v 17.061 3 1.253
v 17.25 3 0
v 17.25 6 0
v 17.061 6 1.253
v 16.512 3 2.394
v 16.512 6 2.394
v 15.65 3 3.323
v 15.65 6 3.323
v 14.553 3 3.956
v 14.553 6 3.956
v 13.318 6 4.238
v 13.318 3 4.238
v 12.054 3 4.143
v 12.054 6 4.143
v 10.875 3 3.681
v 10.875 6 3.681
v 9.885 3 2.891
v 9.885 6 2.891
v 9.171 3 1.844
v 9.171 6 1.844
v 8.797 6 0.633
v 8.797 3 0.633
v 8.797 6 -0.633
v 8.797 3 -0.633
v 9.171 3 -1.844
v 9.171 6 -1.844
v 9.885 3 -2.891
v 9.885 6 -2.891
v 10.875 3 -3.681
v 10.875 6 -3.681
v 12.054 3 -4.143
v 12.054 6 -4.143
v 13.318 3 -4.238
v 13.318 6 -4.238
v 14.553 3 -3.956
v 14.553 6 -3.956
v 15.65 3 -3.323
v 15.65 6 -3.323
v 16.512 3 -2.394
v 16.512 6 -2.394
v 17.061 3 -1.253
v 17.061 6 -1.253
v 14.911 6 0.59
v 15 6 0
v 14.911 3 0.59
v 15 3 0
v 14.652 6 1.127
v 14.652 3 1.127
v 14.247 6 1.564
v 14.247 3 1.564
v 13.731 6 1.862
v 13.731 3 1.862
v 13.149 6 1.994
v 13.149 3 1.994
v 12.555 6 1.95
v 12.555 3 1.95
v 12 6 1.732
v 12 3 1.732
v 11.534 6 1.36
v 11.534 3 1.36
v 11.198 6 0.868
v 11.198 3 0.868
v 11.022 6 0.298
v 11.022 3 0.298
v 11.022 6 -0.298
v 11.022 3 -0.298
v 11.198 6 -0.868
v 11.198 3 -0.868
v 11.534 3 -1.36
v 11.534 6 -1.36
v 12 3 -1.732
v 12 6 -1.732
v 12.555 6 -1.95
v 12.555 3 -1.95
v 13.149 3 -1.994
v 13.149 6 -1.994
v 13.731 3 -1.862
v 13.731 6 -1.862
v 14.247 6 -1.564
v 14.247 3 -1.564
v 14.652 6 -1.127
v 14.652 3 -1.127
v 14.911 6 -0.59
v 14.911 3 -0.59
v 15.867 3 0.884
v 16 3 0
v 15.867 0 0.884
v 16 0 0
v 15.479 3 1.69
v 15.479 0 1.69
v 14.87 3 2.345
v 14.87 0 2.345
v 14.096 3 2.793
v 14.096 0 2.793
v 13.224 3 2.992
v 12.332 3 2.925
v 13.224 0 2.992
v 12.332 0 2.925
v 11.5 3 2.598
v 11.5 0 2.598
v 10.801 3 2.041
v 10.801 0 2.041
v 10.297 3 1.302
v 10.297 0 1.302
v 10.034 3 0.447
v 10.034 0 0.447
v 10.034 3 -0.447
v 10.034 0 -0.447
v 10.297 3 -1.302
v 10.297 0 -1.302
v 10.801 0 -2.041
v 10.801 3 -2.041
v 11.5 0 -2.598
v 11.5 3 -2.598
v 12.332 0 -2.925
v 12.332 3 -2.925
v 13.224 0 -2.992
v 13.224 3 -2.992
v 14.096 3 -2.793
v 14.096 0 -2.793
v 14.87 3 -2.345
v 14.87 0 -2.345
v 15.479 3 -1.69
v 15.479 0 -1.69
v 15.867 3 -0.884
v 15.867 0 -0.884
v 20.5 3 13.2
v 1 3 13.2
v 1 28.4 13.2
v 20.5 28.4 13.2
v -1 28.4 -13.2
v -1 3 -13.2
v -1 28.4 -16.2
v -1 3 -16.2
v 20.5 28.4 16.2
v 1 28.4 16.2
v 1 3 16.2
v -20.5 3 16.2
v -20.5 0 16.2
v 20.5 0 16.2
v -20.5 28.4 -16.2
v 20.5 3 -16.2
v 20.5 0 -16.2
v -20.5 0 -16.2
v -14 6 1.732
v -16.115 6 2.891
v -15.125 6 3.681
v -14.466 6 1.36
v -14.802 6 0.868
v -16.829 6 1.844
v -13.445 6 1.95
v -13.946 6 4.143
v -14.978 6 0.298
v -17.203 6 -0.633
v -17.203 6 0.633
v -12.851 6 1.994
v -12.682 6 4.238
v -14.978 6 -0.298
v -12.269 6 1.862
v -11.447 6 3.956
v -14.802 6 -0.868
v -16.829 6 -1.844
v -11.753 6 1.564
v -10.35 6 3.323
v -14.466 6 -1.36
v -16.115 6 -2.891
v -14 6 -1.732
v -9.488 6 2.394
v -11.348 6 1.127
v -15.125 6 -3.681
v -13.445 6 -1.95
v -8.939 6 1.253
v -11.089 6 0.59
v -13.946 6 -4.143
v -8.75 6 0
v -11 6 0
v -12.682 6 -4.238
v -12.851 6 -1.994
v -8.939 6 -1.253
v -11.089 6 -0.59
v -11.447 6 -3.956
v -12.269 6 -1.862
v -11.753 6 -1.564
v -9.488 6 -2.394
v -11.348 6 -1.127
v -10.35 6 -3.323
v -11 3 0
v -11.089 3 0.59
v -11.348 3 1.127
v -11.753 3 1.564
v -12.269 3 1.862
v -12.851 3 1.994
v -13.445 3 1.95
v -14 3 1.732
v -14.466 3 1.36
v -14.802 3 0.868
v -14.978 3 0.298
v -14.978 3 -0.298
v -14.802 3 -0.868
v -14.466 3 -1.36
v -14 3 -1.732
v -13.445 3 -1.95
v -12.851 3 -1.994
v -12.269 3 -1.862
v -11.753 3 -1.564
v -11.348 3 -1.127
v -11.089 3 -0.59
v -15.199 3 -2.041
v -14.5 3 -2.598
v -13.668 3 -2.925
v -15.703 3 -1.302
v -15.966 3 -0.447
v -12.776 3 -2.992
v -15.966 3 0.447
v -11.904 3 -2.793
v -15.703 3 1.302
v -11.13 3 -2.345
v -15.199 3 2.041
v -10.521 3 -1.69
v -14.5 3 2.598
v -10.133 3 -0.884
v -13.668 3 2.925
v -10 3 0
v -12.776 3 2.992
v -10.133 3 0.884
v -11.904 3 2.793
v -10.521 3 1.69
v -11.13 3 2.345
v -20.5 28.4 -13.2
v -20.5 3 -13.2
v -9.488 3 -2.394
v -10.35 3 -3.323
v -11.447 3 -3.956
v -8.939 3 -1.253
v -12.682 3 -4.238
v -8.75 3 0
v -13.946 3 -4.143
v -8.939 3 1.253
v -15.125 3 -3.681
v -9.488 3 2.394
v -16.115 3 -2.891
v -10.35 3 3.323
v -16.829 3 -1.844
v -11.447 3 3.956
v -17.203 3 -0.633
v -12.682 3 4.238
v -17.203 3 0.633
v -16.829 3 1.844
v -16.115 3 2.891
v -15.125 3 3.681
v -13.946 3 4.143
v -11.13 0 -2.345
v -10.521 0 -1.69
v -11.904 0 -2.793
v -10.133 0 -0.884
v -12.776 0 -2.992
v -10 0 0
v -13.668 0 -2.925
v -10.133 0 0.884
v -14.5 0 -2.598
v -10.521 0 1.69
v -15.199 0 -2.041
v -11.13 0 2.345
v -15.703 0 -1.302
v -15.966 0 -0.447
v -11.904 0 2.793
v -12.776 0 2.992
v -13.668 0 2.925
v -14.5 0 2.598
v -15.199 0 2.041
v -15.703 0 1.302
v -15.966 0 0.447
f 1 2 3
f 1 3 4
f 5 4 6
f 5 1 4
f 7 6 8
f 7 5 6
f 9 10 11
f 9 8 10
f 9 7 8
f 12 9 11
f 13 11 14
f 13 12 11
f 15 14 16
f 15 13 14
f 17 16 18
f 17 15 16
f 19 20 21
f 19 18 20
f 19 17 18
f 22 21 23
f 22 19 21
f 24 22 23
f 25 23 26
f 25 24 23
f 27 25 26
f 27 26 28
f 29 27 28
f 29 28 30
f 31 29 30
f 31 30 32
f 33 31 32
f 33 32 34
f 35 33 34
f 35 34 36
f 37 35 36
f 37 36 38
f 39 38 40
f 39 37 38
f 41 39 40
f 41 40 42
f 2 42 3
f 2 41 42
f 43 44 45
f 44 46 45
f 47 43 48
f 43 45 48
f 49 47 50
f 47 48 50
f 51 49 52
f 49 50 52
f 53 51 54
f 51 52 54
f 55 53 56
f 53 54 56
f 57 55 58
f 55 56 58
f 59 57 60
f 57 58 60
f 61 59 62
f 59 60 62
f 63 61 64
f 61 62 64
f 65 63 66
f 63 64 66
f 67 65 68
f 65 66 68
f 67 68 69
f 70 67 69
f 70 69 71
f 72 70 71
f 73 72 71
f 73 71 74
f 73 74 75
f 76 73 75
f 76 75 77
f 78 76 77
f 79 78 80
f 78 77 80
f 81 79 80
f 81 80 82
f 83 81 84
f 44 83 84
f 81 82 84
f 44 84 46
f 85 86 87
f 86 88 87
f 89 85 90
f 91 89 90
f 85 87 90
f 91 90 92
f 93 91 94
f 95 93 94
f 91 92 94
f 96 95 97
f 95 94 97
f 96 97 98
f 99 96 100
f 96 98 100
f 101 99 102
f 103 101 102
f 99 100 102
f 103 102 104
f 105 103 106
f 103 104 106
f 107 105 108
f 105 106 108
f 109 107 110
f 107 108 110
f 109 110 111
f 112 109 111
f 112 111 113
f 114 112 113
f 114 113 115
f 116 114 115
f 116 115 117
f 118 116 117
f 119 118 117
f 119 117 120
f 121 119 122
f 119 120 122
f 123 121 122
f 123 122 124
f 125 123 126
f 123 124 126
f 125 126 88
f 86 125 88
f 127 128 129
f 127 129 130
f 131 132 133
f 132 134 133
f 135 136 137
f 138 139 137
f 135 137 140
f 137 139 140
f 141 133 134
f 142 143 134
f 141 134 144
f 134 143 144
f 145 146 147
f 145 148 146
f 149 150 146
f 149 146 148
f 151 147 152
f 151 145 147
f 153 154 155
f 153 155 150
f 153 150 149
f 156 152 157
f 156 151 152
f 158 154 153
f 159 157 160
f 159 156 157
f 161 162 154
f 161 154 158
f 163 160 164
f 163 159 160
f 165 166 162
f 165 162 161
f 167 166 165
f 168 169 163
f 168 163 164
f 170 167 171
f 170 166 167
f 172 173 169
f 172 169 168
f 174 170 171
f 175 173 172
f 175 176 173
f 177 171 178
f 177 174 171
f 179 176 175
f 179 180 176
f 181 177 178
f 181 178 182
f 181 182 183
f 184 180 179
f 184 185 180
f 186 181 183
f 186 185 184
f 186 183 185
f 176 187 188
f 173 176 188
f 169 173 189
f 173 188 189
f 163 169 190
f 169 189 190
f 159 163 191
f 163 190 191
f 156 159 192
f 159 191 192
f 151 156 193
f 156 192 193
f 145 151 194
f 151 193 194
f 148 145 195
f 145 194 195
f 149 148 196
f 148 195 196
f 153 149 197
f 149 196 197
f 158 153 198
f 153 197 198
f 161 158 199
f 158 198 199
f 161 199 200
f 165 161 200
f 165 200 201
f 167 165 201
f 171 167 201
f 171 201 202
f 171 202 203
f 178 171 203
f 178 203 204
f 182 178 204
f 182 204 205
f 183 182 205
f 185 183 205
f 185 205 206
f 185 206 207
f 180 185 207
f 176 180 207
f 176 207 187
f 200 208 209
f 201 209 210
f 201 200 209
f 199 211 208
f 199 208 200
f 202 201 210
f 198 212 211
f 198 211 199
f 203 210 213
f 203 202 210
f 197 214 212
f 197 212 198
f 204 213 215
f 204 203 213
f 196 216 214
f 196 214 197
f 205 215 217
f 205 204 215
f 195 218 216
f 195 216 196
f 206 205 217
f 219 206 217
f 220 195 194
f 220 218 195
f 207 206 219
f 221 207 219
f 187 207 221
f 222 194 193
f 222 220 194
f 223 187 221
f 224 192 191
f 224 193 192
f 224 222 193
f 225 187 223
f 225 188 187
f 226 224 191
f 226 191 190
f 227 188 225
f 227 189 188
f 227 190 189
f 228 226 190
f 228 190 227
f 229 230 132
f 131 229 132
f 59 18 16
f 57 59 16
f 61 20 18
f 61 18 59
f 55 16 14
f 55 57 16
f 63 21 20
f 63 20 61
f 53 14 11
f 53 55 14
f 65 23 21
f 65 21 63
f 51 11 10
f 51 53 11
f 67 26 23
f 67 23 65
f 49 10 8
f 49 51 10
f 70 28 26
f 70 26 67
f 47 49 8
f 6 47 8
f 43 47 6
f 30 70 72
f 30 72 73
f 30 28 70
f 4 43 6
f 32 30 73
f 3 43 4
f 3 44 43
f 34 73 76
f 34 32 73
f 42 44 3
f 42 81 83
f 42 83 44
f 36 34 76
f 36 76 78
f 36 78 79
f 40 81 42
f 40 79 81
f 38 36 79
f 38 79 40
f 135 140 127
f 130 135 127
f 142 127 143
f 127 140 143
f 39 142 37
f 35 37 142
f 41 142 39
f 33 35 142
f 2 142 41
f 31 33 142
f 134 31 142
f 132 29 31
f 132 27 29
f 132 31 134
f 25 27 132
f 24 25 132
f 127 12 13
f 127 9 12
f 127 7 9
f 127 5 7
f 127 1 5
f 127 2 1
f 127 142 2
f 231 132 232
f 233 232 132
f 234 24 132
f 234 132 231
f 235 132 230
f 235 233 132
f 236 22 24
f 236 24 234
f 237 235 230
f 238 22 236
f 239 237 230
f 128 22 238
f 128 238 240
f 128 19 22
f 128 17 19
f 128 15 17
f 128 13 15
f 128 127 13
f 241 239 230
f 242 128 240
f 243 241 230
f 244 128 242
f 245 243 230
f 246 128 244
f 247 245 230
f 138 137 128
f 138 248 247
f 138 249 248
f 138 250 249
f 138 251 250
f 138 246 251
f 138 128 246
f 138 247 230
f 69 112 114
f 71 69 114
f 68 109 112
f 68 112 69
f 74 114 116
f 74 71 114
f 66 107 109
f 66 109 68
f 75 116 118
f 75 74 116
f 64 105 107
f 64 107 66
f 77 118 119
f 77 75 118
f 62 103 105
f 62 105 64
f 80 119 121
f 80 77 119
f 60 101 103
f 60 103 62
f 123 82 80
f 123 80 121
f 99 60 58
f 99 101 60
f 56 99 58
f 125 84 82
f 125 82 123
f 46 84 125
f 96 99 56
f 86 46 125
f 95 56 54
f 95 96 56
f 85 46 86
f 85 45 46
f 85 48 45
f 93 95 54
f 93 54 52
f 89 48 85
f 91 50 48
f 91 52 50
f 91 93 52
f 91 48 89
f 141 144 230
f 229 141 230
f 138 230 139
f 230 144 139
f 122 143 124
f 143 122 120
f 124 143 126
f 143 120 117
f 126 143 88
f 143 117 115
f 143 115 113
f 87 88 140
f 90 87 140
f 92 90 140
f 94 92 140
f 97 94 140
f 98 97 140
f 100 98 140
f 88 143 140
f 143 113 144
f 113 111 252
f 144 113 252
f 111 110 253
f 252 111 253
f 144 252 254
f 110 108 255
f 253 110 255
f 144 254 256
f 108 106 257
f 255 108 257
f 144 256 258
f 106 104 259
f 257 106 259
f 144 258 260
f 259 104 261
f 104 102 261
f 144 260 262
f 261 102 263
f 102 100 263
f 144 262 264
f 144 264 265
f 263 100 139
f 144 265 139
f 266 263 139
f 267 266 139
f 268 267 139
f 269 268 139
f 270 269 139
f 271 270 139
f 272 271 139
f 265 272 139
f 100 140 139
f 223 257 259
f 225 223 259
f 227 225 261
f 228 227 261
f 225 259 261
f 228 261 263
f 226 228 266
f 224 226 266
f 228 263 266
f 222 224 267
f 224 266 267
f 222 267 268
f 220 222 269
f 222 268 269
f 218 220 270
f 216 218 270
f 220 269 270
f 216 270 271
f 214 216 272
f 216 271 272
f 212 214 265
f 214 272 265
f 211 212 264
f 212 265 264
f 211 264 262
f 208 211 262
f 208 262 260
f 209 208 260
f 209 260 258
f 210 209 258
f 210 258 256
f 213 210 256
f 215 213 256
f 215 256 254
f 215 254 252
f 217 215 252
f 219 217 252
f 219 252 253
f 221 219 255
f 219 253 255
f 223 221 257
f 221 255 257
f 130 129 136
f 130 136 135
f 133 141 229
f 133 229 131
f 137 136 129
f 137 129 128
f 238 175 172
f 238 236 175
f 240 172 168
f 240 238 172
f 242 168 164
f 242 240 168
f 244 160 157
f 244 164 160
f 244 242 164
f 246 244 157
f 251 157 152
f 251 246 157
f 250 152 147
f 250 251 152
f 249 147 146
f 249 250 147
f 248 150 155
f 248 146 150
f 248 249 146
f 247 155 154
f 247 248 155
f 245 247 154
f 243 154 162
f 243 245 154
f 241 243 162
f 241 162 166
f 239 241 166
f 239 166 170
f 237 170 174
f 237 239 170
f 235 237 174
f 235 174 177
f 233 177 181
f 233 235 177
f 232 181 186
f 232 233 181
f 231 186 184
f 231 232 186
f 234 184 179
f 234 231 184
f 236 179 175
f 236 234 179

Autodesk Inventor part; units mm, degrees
ref_plane "YZ Plane" through (0, 0, 0) normal (1, 0, 0) x (0, 1, 0)
ref_plane "XZ Plane" through (0, 0, 0) normal (0, 1, 0) x (-1, 0, 0)
ref_plane "XY Plane" through (0, 0, 0) normal (0, 0, 1) x (1, 0, 0)
sketch "Sketch1" plane through (0, 0, 0) normal (0, 1, 0) x (-1, 0, 0)
  line L0 (20.5, 16.2) -> (-20.5, 16.2)
  line L1 (-20.5, 16.2) -> (-20.5, -16.2)
  line L2 (-20.5, -16.2) -> (20.5, -16.2)
  line L3 (20.5, -16.2) -> (20.5, 16.2)
  point P0 (0, 0)
  dimension "d0" = 41
  dimension "d1" = 32.4
extrude "Extrusion1" add sketch "Sketch1" along normal blind 3
sketch "Sketch3" plane through (0, 3, 0) normal (0, 1, 0) x (1, 0, 0)
  line L0 (-20.5, -16.2) -> (20.5, -16.2) projected
  line L1 (-20.5, 16.2) -> (-20.5, -16.2) projected
  line L2 (20.5, -16.2) -> (-20.5, -16.2)
  line L3 (-20.5, -16.2) -> (-20.5, -13.2)
  line L4 (-20.5, -13.2) -> (20.5, -13.2)
  line L5 (20.5, -13.2) -> (20.5, -16.2)
  line L6 (20.5, 16.2) -> (-20.5, 16.2) projected
  line L7 (20.5, 16.2) -> (-20.5, 16.2)
  line L8 (-20.5, 16.2) -> (-20.5, 13.2)
  line L9 (-20.5, 13.2) -> (20.5, 13.2)
  line L10 (20.5, 13.2) -> (20.5, 16.2)
  point P0 (0, 0)
  dimension "d8" = 3
  dimension "d9" = 3
extrude "Extrusion3" add sketch "Sketch3" along normal blind 25.4
sketch "Sketch4" plane through (20.5, 0, -16.2) normal (0, 0, -1) x (-1, 0, 0)
  line L0 (41, 3) -> (0, 3) projected
  line L1 (0, 28.4) -> (41, 28.4) projected
  line L2 (0, 3) -> (21.5, 3)
  line L3 (21.5, 3) -> (21.5, 28.4)
  line L4 (21.5, 28.4) -> (0, 28.4)
  line L5 (0, 28.4) -> (0, 3)
  point P0 (20.5, 0)
  dimension "d12" = 21.5
extrude "Extrusion4" cut sketch "Sketch4" against normal blind 3
sketch "Sketch5" plane through (-20.5, 0, 16.2) normal (0, 0, 1) x (1, 0, 0)
  line L0 (41, 28.4) -> (0, 28.4) projected
  line L1 (19.5, 3) -> (41, 3) projected
  line L2 (0, 28.4) -> (21.5, 28.4)
  line L3 (21.5, 28.4) -> (21.5, 3)
  line L4 (21.5, 3) -> (0, 3)
  line L5 (0, 3) -> (0, 28.4)
  point P0 (20.5, 0)
  dimension "d15" = 21.5
extrude "Extrusion5" cut sketch "Sketch5" against normal blind 3
sketch "Sketch6" plane through (0, 3, 0) normal (0, 1, 0) x (1, 0, 0)
  circle A0 centre (13, 0) radius 4.25
  circle A1 centre (-13, 0) radius 4.25
  point P0 (0, 0)
  dimension "d20" = 8.5
  dimension "d21" = 8.5
extrude "Extrusion6" add sketch "Sketch6" along normal blind 3
sketch "Sketch7" plane through (0, 0, 0) normal (0, -1, 0) x (1, 0, 0)
  circle A0 centre (-13, 0) radius 4.25 projected
  circle A1 centre (-13, 0) radius 2
  circle A2 centre (13, 0) radius 4.25 projected
  circle A3 centre (13, 0) radius 2
  point P0 (0, 0)
  dimension "d24" = 4
  dimension "d25" = 4
extrude "Extrusion7" cut sketch "Sketch7" against normal blind 6 contours A1 | A3
sketch "Sketch8" plane through (0, 0, 0) normal (0, -1, 0) x (1, 0, 0)
  circle A0 centre (-13, 0) radius 2 projected
  circle A1 centre (-13, 0) radius 3
  circle A2 centre (13, 0) radius 2 projected
  circle A3 centre (13, 0) radius 3
  point P0 (0, 0)
  dimension "d28" = 6
  dimension "d29" = 6
extrude "Extrusion8" cut sketch "Sketch8" against normal blind 3 contours A0 | A1 | A2 | A3
properties part number "stepperBracket"
